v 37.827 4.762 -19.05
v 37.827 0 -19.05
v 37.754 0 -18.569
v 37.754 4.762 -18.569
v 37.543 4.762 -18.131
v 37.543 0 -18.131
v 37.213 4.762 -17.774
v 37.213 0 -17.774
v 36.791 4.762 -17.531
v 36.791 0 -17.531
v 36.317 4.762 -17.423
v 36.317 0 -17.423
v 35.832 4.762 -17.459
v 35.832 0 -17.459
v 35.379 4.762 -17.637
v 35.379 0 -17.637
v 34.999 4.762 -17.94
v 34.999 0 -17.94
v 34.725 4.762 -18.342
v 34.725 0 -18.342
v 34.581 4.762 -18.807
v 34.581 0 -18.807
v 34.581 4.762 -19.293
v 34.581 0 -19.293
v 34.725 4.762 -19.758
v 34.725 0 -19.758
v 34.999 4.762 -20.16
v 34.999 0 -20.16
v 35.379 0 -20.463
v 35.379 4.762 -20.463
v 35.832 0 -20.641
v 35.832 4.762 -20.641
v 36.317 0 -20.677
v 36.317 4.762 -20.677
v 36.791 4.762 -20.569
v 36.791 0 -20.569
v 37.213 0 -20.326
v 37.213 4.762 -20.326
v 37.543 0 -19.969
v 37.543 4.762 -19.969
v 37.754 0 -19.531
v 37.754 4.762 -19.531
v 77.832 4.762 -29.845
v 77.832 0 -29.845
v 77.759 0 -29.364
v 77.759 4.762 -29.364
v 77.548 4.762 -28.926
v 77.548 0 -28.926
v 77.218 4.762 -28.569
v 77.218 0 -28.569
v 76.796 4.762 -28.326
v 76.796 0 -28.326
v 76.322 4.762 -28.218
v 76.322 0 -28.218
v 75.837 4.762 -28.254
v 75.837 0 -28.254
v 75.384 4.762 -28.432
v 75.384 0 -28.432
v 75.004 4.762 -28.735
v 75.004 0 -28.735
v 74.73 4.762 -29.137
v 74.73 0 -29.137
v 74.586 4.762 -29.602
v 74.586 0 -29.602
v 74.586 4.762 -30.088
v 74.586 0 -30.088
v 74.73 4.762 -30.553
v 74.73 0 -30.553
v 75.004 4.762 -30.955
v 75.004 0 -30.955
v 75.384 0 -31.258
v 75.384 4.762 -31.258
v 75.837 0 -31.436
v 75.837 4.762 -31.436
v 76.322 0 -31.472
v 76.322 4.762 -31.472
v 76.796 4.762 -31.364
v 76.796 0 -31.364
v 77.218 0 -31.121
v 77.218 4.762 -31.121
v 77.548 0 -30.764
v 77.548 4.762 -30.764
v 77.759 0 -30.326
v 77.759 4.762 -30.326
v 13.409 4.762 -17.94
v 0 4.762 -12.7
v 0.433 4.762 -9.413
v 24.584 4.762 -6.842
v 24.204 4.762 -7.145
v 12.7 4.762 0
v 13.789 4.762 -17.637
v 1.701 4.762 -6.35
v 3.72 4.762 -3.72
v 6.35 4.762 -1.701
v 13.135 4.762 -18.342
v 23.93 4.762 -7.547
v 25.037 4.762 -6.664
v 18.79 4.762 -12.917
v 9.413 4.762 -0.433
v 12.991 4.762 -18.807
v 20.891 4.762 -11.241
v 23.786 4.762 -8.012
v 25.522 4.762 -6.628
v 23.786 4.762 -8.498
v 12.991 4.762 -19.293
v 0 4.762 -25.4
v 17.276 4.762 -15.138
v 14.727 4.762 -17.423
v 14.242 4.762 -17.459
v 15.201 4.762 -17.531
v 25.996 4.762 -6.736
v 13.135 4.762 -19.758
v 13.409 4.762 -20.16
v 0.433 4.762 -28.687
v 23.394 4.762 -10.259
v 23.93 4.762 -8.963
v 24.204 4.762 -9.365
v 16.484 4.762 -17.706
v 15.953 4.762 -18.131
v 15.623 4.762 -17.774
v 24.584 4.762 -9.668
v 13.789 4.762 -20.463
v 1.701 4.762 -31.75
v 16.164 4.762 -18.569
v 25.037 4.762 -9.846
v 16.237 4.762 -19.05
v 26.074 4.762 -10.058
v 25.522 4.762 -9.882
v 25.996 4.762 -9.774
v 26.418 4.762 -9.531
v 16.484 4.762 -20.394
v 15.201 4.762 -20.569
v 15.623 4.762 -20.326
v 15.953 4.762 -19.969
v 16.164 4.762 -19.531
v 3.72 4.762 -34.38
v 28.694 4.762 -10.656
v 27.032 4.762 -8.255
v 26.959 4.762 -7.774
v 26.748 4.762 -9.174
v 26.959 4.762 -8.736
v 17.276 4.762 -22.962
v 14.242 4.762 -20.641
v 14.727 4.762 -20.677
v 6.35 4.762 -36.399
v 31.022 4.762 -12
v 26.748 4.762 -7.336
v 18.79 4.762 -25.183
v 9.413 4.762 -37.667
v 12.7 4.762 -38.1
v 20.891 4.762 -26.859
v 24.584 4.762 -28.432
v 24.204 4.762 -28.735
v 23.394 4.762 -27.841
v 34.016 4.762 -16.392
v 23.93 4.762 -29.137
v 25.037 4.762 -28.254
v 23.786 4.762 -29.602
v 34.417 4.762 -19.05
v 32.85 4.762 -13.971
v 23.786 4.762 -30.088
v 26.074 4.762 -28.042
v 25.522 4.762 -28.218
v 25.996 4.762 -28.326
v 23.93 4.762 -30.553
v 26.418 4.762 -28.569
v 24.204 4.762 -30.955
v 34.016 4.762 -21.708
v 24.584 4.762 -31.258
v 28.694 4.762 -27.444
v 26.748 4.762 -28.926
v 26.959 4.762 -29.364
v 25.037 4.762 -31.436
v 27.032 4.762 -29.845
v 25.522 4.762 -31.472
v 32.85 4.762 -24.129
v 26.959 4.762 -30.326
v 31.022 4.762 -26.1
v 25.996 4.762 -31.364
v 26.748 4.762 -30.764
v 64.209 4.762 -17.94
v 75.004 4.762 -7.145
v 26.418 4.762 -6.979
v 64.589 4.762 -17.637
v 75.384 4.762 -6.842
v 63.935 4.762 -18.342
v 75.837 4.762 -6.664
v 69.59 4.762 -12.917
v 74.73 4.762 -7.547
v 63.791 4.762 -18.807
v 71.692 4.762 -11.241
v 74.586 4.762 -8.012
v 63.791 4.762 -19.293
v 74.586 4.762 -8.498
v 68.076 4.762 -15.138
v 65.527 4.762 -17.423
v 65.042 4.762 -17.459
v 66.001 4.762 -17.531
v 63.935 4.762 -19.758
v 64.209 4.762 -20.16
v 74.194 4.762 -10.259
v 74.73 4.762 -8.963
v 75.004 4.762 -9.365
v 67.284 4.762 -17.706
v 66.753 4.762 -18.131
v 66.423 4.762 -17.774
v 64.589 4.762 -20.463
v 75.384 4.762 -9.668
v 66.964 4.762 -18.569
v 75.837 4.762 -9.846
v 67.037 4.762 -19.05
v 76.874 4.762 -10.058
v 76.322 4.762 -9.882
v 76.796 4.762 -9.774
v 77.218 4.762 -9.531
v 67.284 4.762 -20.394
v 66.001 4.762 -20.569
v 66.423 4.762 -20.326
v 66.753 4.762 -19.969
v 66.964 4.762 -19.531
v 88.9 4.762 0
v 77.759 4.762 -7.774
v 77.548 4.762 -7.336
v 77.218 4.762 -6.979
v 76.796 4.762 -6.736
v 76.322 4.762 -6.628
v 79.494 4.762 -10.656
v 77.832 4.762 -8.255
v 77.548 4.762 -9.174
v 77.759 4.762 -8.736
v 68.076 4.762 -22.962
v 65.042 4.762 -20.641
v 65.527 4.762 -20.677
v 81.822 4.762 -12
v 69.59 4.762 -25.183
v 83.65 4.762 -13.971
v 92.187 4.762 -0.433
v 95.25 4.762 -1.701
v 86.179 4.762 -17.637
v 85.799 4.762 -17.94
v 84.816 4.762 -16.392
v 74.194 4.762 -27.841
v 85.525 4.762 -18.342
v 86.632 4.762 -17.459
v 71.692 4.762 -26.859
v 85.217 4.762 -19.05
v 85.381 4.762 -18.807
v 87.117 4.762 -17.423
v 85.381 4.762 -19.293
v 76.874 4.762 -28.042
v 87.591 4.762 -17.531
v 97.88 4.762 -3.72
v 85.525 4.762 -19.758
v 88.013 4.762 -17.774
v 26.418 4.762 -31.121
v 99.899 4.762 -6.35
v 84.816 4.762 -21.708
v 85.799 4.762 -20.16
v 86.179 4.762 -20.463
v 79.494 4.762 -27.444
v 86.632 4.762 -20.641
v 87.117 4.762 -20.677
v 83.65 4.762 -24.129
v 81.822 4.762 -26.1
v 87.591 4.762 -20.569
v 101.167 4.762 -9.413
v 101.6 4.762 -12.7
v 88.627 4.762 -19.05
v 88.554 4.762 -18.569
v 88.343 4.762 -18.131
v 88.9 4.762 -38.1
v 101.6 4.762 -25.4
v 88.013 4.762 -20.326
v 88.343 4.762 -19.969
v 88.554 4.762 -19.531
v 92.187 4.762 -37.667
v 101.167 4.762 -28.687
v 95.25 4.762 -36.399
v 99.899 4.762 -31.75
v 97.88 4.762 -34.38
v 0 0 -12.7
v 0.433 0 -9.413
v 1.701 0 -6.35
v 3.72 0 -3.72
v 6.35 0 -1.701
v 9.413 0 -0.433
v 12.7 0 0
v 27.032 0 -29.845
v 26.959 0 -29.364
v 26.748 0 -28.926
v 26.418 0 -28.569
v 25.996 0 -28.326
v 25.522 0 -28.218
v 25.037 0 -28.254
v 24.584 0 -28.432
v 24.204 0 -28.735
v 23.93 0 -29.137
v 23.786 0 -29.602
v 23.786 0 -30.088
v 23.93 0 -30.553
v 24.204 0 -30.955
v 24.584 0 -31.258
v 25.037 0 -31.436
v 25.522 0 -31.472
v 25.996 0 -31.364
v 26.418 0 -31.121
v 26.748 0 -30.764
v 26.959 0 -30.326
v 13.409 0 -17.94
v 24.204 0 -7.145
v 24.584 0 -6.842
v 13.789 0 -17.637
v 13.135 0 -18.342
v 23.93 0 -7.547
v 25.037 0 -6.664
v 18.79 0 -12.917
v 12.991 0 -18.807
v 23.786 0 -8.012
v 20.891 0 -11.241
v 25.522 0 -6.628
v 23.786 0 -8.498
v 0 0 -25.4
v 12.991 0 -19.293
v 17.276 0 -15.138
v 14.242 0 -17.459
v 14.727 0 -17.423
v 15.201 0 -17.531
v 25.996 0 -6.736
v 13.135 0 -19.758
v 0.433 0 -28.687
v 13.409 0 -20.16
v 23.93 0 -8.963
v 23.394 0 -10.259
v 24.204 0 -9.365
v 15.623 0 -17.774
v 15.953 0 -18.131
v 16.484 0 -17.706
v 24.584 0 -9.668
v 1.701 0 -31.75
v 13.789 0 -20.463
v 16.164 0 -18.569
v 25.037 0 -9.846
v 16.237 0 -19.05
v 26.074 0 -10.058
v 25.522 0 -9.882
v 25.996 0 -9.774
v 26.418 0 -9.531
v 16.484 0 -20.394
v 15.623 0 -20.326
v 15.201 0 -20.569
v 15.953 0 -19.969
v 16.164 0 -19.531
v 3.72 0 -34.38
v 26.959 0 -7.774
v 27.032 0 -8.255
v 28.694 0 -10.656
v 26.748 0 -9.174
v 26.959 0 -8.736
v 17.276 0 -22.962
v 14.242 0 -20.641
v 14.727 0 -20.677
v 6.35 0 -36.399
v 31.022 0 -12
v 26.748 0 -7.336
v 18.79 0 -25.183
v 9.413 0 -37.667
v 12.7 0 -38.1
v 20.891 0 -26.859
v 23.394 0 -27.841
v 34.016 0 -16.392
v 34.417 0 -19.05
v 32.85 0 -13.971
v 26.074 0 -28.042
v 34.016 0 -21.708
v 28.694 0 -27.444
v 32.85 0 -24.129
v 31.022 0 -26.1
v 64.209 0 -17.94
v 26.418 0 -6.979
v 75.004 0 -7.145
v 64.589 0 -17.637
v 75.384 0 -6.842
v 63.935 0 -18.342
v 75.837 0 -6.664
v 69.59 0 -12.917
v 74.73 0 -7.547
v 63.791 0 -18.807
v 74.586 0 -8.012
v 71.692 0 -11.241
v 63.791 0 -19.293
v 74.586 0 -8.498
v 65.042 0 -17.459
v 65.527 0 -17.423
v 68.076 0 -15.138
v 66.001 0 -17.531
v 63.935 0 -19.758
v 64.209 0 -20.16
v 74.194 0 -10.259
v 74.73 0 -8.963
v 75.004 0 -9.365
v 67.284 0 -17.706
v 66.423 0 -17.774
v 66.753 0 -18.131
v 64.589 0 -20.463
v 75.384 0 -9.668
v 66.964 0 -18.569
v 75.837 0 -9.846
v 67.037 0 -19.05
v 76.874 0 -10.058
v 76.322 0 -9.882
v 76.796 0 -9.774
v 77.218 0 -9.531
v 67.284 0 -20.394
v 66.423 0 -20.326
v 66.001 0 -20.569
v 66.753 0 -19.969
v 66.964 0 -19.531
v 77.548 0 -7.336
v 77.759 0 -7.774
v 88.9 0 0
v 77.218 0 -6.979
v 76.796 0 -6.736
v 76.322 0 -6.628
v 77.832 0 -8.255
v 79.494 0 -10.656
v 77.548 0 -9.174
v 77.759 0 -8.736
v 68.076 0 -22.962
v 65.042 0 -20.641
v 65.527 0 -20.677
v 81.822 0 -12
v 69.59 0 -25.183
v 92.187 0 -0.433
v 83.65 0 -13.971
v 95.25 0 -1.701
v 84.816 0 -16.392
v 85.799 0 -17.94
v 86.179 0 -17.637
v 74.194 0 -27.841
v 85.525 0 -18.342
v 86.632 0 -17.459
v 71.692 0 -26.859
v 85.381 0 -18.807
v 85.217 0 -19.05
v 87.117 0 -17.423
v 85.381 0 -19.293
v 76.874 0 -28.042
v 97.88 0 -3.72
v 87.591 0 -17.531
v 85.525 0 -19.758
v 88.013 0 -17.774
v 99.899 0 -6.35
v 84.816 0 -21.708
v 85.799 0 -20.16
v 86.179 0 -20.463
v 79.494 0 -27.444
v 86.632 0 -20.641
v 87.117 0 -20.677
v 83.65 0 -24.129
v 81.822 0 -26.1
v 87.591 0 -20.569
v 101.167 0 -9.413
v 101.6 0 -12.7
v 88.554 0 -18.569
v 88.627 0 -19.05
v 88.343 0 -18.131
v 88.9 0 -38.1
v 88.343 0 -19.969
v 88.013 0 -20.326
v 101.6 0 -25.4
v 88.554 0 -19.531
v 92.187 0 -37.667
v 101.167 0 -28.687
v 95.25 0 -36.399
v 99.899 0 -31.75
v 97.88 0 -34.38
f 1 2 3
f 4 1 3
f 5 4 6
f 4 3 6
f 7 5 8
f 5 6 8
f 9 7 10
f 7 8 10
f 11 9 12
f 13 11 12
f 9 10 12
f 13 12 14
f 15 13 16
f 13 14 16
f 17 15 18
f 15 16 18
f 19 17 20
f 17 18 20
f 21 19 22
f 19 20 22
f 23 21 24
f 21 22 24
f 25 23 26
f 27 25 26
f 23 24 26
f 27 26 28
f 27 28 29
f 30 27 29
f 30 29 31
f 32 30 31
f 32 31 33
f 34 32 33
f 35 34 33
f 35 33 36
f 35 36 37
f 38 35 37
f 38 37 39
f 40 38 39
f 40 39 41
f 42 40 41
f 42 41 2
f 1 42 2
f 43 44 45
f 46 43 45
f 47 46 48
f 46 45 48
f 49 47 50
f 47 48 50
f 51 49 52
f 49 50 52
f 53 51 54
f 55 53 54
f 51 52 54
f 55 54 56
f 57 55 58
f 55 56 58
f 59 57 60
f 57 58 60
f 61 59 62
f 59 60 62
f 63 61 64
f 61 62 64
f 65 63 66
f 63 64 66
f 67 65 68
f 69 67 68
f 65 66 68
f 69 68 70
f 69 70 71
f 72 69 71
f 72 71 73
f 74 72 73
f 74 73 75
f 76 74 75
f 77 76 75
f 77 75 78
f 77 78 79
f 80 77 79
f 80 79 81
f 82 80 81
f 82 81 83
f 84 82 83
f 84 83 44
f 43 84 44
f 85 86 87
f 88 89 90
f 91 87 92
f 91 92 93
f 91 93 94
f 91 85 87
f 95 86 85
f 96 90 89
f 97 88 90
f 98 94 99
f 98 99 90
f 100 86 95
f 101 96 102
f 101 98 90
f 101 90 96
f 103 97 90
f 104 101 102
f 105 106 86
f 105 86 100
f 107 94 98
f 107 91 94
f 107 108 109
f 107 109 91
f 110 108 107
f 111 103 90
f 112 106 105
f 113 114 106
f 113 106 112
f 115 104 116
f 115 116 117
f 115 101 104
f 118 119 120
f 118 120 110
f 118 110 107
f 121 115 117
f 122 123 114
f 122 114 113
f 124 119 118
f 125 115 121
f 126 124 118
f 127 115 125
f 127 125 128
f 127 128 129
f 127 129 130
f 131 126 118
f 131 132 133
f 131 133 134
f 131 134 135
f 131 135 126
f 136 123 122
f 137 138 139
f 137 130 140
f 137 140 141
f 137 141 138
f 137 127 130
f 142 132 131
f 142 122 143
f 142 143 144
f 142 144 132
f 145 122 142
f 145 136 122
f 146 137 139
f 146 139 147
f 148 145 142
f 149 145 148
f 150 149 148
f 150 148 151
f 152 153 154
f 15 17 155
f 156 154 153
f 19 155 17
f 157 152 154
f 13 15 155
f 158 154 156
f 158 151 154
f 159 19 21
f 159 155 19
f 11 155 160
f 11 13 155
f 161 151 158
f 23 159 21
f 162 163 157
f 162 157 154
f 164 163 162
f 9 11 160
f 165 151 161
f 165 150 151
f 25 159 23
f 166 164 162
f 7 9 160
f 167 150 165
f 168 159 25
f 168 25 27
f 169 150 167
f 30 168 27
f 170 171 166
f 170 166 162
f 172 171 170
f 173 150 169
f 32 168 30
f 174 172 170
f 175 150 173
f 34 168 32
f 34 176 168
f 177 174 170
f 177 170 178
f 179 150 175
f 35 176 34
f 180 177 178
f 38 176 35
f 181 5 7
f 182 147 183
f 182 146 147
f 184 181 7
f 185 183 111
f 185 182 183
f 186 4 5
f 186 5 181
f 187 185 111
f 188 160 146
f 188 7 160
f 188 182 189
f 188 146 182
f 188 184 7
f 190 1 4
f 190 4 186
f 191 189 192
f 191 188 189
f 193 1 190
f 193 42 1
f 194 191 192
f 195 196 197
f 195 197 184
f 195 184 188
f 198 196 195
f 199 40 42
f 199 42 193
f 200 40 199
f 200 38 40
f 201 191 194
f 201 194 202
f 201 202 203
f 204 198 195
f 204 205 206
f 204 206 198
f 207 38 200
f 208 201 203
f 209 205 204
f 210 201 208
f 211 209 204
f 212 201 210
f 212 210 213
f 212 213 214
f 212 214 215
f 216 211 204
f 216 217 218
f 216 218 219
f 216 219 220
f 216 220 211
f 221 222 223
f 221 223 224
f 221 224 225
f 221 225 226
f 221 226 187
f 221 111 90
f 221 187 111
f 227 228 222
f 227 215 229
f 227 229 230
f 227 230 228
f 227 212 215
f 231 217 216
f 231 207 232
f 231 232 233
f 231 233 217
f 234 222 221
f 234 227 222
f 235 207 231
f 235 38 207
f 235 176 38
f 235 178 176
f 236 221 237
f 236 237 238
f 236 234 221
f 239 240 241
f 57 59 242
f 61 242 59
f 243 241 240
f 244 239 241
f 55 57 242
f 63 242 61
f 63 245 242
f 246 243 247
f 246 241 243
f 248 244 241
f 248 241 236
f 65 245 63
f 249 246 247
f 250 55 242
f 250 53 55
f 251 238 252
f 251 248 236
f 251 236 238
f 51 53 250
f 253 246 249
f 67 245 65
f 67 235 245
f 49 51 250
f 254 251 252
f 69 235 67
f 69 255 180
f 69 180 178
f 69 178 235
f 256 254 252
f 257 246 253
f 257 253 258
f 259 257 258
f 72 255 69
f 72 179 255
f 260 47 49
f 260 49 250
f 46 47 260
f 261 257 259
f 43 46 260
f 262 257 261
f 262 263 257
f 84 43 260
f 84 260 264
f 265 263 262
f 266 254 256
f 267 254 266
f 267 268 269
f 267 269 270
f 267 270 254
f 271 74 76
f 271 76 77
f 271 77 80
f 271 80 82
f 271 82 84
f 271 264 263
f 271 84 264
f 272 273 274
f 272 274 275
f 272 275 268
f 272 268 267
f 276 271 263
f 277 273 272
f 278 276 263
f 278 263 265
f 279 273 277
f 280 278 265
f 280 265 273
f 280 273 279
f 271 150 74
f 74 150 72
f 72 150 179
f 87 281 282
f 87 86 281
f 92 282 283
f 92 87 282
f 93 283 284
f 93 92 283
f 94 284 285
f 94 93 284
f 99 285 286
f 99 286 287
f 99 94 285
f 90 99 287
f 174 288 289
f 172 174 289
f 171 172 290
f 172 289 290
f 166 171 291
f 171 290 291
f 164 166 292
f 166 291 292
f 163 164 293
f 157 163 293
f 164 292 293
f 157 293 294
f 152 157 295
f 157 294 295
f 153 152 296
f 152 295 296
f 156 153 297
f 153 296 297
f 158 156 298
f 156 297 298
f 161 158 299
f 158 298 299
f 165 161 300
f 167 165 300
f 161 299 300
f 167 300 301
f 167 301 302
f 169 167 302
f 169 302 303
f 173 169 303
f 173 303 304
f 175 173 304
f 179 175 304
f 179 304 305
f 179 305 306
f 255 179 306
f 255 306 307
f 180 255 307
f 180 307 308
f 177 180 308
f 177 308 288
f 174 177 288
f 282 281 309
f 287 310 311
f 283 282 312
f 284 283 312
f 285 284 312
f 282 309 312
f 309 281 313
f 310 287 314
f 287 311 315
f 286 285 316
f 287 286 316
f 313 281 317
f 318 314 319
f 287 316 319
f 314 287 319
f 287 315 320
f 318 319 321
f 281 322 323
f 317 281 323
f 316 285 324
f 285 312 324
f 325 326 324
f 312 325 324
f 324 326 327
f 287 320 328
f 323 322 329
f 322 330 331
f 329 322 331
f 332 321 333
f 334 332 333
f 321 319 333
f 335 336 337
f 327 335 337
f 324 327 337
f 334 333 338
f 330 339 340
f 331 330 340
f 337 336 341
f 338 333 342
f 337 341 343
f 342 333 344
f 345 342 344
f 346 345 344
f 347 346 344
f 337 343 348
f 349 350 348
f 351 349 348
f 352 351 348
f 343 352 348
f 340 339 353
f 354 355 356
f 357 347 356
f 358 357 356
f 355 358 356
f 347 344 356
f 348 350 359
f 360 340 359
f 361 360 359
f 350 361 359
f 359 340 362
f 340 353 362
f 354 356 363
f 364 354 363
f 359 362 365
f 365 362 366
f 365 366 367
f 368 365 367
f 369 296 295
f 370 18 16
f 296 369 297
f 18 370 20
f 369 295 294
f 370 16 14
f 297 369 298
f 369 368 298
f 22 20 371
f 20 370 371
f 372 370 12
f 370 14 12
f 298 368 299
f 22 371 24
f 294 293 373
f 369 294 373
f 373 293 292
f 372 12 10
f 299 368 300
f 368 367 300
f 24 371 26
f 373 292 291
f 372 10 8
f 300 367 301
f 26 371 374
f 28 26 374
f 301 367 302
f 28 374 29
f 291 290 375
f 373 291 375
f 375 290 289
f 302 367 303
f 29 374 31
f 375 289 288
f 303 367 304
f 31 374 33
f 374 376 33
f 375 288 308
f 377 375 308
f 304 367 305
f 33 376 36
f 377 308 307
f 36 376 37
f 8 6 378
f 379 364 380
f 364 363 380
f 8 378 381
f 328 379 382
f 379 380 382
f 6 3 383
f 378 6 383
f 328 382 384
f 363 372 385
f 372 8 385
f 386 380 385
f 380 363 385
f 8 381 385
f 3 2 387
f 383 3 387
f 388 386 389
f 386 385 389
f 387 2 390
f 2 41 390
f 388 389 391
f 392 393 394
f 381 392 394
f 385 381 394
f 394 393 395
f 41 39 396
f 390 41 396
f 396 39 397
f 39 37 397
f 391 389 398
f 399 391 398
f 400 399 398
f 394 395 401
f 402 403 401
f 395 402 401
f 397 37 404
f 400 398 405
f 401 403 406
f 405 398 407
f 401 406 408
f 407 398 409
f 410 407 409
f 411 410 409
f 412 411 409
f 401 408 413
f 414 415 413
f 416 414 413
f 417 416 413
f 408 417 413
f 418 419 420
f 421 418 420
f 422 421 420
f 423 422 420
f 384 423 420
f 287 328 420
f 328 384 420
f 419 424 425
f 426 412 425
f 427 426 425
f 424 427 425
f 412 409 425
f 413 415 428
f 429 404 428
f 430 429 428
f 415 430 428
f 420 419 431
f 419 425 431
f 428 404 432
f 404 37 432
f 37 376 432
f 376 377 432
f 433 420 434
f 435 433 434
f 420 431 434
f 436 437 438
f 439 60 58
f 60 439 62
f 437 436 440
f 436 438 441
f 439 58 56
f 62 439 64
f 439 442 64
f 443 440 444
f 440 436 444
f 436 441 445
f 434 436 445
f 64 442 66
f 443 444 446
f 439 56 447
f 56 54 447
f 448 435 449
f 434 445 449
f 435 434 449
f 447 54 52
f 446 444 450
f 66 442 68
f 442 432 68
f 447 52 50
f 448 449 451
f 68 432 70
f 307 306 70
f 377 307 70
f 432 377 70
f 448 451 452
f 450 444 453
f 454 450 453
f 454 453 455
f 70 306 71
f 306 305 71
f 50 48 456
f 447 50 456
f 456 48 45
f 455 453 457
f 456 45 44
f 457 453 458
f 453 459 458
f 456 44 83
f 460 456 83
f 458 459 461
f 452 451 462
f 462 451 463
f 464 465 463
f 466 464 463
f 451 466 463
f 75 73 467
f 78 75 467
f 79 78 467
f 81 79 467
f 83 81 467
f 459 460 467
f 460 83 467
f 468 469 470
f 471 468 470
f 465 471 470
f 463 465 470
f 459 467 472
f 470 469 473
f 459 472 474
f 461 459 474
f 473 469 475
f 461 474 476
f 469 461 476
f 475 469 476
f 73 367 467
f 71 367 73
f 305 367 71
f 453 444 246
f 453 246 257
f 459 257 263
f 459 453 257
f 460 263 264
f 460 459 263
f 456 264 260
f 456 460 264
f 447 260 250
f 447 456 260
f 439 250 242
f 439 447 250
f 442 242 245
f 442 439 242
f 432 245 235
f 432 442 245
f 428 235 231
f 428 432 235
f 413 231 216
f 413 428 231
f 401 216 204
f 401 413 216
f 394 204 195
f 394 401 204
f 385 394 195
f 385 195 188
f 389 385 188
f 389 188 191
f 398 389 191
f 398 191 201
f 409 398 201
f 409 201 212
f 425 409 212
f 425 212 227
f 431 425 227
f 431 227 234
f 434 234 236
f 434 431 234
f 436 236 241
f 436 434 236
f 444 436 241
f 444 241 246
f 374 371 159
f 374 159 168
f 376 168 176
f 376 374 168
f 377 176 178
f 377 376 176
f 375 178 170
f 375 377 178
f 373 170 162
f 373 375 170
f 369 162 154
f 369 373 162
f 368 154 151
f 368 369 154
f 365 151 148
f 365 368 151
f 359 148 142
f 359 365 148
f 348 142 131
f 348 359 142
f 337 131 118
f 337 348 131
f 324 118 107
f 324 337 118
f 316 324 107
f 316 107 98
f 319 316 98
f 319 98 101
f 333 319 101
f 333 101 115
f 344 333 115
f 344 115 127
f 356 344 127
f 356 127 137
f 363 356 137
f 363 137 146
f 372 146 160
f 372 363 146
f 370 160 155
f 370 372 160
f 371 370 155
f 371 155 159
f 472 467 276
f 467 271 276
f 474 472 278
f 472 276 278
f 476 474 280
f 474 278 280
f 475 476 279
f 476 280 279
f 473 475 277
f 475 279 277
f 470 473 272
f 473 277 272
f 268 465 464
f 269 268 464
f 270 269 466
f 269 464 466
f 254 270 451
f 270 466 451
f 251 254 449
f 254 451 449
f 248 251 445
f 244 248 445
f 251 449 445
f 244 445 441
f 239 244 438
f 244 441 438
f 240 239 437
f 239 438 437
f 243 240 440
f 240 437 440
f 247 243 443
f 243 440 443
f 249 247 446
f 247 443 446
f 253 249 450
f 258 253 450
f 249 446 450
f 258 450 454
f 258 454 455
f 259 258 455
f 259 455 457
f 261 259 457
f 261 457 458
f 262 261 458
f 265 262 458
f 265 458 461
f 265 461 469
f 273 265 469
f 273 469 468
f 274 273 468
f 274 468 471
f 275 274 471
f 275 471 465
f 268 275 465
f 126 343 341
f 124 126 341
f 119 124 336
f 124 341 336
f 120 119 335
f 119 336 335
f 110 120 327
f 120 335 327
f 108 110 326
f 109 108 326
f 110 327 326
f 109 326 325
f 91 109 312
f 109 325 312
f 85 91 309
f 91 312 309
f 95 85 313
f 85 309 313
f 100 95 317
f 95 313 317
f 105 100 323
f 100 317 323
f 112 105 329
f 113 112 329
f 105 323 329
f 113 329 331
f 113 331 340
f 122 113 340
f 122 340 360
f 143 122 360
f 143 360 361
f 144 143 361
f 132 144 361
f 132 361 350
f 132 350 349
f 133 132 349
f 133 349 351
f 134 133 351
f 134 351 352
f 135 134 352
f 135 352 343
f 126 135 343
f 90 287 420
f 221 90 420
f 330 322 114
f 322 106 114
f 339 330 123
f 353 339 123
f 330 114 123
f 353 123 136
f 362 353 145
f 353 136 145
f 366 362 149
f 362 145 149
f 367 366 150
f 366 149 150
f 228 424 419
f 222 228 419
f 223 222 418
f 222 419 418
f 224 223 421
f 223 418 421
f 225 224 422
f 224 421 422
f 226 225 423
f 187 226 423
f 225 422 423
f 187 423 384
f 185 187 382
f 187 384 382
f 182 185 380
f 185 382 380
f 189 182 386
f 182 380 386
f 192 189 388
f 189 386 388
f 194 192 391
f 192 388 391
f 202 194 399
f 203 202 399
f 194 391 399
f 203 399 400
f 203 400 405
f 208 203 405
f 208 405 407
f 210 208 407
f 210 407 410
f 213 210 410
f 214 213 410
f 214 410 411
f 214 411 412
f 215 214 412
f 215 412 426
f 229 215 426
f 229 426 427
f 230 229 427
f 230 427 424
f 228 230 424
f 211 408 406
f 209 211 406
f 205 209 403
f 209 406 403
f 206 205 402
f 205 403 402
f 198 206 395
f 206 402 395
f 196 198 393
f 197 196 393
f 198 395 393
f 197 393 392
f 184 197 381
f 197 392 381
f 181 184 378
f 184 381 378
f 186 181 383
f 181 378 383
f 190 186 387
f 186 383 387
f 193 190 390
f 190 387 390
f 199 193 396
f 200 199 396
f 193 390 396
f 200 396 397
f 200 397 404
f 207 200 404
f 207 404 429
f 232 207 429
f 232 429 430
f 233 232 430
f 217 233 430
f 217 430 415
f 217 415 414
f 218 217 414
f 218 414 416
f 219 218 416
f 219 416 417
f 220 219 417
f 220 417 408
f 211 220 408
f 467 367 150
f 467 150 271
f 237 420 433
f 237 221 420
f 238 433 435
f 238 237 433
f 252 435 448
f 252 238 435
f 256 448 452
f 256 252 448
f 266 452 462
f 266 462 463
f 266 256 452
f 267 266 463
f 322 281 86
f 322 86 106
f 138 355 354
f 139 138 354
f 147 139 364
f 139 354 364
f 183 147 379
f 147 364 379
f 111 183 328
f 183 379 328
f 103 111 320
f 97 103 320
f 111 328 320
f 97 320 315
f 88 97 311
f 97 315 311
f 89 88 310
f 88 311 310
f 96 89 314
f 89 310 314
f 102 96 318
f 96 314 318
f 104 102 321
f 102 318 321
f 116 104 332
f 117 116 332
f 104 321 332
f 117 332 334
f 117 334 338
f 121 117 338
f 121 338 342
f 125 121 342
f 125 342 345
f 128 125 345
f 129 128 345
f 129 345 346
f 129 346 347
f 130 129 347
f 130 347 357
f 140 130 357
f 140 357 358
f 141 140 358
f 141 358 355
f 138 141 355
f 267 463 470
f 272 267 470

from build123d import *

# Parameters (mm, degrees)
SKETCH1_W                 = 101.6
SKETCH1_H                 = 38.1
SKETCH1_R                 = 9.017
BOSS_EXTRUDE1_DEPTH       = 4.7625
F_4_CLEARANCE_HOLE1_D     = 3.2639
F_4_CLEARANCE_HOLE1_DEPTH = 25.4
F_4_CLEARANCE_HOLE1_TIP   = 0.980574487
FILLET1_R                 = 12.7


with BuildPart() as part:
    # Sketch1 → Boss-Extrude1 (new body)
    with BuildSketch(Plane(origin=(0, 0, 0), x_dir=(1, 0, 0), z_dir=(0, 1, 0))):
        with Locations((50.8, 19.05)):
            Rectangle(SKETCH1_W, SKETCH1_H)
        with Locations((25.4, 19.05)):
            Circle(SKETCH1_R, mode=Mode.SUBTRACT)
        with Locations((76.2, 19.05)):
            Circle(SKETCH1_R, mode=Mode.SUBTRACT)
    extrude(amount=BOSS_EXTRUDE1_DEPTH)

    # #4 Clearance Hole1
    with Locations(Plane(origin=(0, 4.7625, 0), x_dir=(-1, 0, 0), z_dir=(0, 1, 0))):
        with Locations((-25.4, -29.845), (-36.195, -19.05), (-25.4, -8.255), (-14.605, -19.05), (-65.405, -19.05), (-76.2, -29.845), (-86.995, -19.05), (-76.2, -8.255)):
            Hole(F_4_CLEARANCE_HOLE1_D / 2, depth=F_4_CLEARANCE_HOLE1_DEPTH)
            with Locations((0, 0, -(F_4_CLEARANCE_HOLE1_DEPTH + F_4_CLEARANCE_HOLE1_TIP / 2))):  # 118° drill point
                Cone(0, F_4_CLEARANCE_HOLE1_D / 2, F_4_CLEARANCE_HOLE1_TIP, mode=Mode.SUBTRACT)

    # Fillet1
    fillet1_edges = [part.edges().sort_by_distance(p)[0] for p in [
        (0, 2.38125, -38.1),
        (101.6, 2.38125, -38.1),
        (101.6, 2.38125, 0),
        (0, 2.38125, 0),
    ]]
    fillet(fillet1_edges, radius=FILLET1_R)


solid = part.part
